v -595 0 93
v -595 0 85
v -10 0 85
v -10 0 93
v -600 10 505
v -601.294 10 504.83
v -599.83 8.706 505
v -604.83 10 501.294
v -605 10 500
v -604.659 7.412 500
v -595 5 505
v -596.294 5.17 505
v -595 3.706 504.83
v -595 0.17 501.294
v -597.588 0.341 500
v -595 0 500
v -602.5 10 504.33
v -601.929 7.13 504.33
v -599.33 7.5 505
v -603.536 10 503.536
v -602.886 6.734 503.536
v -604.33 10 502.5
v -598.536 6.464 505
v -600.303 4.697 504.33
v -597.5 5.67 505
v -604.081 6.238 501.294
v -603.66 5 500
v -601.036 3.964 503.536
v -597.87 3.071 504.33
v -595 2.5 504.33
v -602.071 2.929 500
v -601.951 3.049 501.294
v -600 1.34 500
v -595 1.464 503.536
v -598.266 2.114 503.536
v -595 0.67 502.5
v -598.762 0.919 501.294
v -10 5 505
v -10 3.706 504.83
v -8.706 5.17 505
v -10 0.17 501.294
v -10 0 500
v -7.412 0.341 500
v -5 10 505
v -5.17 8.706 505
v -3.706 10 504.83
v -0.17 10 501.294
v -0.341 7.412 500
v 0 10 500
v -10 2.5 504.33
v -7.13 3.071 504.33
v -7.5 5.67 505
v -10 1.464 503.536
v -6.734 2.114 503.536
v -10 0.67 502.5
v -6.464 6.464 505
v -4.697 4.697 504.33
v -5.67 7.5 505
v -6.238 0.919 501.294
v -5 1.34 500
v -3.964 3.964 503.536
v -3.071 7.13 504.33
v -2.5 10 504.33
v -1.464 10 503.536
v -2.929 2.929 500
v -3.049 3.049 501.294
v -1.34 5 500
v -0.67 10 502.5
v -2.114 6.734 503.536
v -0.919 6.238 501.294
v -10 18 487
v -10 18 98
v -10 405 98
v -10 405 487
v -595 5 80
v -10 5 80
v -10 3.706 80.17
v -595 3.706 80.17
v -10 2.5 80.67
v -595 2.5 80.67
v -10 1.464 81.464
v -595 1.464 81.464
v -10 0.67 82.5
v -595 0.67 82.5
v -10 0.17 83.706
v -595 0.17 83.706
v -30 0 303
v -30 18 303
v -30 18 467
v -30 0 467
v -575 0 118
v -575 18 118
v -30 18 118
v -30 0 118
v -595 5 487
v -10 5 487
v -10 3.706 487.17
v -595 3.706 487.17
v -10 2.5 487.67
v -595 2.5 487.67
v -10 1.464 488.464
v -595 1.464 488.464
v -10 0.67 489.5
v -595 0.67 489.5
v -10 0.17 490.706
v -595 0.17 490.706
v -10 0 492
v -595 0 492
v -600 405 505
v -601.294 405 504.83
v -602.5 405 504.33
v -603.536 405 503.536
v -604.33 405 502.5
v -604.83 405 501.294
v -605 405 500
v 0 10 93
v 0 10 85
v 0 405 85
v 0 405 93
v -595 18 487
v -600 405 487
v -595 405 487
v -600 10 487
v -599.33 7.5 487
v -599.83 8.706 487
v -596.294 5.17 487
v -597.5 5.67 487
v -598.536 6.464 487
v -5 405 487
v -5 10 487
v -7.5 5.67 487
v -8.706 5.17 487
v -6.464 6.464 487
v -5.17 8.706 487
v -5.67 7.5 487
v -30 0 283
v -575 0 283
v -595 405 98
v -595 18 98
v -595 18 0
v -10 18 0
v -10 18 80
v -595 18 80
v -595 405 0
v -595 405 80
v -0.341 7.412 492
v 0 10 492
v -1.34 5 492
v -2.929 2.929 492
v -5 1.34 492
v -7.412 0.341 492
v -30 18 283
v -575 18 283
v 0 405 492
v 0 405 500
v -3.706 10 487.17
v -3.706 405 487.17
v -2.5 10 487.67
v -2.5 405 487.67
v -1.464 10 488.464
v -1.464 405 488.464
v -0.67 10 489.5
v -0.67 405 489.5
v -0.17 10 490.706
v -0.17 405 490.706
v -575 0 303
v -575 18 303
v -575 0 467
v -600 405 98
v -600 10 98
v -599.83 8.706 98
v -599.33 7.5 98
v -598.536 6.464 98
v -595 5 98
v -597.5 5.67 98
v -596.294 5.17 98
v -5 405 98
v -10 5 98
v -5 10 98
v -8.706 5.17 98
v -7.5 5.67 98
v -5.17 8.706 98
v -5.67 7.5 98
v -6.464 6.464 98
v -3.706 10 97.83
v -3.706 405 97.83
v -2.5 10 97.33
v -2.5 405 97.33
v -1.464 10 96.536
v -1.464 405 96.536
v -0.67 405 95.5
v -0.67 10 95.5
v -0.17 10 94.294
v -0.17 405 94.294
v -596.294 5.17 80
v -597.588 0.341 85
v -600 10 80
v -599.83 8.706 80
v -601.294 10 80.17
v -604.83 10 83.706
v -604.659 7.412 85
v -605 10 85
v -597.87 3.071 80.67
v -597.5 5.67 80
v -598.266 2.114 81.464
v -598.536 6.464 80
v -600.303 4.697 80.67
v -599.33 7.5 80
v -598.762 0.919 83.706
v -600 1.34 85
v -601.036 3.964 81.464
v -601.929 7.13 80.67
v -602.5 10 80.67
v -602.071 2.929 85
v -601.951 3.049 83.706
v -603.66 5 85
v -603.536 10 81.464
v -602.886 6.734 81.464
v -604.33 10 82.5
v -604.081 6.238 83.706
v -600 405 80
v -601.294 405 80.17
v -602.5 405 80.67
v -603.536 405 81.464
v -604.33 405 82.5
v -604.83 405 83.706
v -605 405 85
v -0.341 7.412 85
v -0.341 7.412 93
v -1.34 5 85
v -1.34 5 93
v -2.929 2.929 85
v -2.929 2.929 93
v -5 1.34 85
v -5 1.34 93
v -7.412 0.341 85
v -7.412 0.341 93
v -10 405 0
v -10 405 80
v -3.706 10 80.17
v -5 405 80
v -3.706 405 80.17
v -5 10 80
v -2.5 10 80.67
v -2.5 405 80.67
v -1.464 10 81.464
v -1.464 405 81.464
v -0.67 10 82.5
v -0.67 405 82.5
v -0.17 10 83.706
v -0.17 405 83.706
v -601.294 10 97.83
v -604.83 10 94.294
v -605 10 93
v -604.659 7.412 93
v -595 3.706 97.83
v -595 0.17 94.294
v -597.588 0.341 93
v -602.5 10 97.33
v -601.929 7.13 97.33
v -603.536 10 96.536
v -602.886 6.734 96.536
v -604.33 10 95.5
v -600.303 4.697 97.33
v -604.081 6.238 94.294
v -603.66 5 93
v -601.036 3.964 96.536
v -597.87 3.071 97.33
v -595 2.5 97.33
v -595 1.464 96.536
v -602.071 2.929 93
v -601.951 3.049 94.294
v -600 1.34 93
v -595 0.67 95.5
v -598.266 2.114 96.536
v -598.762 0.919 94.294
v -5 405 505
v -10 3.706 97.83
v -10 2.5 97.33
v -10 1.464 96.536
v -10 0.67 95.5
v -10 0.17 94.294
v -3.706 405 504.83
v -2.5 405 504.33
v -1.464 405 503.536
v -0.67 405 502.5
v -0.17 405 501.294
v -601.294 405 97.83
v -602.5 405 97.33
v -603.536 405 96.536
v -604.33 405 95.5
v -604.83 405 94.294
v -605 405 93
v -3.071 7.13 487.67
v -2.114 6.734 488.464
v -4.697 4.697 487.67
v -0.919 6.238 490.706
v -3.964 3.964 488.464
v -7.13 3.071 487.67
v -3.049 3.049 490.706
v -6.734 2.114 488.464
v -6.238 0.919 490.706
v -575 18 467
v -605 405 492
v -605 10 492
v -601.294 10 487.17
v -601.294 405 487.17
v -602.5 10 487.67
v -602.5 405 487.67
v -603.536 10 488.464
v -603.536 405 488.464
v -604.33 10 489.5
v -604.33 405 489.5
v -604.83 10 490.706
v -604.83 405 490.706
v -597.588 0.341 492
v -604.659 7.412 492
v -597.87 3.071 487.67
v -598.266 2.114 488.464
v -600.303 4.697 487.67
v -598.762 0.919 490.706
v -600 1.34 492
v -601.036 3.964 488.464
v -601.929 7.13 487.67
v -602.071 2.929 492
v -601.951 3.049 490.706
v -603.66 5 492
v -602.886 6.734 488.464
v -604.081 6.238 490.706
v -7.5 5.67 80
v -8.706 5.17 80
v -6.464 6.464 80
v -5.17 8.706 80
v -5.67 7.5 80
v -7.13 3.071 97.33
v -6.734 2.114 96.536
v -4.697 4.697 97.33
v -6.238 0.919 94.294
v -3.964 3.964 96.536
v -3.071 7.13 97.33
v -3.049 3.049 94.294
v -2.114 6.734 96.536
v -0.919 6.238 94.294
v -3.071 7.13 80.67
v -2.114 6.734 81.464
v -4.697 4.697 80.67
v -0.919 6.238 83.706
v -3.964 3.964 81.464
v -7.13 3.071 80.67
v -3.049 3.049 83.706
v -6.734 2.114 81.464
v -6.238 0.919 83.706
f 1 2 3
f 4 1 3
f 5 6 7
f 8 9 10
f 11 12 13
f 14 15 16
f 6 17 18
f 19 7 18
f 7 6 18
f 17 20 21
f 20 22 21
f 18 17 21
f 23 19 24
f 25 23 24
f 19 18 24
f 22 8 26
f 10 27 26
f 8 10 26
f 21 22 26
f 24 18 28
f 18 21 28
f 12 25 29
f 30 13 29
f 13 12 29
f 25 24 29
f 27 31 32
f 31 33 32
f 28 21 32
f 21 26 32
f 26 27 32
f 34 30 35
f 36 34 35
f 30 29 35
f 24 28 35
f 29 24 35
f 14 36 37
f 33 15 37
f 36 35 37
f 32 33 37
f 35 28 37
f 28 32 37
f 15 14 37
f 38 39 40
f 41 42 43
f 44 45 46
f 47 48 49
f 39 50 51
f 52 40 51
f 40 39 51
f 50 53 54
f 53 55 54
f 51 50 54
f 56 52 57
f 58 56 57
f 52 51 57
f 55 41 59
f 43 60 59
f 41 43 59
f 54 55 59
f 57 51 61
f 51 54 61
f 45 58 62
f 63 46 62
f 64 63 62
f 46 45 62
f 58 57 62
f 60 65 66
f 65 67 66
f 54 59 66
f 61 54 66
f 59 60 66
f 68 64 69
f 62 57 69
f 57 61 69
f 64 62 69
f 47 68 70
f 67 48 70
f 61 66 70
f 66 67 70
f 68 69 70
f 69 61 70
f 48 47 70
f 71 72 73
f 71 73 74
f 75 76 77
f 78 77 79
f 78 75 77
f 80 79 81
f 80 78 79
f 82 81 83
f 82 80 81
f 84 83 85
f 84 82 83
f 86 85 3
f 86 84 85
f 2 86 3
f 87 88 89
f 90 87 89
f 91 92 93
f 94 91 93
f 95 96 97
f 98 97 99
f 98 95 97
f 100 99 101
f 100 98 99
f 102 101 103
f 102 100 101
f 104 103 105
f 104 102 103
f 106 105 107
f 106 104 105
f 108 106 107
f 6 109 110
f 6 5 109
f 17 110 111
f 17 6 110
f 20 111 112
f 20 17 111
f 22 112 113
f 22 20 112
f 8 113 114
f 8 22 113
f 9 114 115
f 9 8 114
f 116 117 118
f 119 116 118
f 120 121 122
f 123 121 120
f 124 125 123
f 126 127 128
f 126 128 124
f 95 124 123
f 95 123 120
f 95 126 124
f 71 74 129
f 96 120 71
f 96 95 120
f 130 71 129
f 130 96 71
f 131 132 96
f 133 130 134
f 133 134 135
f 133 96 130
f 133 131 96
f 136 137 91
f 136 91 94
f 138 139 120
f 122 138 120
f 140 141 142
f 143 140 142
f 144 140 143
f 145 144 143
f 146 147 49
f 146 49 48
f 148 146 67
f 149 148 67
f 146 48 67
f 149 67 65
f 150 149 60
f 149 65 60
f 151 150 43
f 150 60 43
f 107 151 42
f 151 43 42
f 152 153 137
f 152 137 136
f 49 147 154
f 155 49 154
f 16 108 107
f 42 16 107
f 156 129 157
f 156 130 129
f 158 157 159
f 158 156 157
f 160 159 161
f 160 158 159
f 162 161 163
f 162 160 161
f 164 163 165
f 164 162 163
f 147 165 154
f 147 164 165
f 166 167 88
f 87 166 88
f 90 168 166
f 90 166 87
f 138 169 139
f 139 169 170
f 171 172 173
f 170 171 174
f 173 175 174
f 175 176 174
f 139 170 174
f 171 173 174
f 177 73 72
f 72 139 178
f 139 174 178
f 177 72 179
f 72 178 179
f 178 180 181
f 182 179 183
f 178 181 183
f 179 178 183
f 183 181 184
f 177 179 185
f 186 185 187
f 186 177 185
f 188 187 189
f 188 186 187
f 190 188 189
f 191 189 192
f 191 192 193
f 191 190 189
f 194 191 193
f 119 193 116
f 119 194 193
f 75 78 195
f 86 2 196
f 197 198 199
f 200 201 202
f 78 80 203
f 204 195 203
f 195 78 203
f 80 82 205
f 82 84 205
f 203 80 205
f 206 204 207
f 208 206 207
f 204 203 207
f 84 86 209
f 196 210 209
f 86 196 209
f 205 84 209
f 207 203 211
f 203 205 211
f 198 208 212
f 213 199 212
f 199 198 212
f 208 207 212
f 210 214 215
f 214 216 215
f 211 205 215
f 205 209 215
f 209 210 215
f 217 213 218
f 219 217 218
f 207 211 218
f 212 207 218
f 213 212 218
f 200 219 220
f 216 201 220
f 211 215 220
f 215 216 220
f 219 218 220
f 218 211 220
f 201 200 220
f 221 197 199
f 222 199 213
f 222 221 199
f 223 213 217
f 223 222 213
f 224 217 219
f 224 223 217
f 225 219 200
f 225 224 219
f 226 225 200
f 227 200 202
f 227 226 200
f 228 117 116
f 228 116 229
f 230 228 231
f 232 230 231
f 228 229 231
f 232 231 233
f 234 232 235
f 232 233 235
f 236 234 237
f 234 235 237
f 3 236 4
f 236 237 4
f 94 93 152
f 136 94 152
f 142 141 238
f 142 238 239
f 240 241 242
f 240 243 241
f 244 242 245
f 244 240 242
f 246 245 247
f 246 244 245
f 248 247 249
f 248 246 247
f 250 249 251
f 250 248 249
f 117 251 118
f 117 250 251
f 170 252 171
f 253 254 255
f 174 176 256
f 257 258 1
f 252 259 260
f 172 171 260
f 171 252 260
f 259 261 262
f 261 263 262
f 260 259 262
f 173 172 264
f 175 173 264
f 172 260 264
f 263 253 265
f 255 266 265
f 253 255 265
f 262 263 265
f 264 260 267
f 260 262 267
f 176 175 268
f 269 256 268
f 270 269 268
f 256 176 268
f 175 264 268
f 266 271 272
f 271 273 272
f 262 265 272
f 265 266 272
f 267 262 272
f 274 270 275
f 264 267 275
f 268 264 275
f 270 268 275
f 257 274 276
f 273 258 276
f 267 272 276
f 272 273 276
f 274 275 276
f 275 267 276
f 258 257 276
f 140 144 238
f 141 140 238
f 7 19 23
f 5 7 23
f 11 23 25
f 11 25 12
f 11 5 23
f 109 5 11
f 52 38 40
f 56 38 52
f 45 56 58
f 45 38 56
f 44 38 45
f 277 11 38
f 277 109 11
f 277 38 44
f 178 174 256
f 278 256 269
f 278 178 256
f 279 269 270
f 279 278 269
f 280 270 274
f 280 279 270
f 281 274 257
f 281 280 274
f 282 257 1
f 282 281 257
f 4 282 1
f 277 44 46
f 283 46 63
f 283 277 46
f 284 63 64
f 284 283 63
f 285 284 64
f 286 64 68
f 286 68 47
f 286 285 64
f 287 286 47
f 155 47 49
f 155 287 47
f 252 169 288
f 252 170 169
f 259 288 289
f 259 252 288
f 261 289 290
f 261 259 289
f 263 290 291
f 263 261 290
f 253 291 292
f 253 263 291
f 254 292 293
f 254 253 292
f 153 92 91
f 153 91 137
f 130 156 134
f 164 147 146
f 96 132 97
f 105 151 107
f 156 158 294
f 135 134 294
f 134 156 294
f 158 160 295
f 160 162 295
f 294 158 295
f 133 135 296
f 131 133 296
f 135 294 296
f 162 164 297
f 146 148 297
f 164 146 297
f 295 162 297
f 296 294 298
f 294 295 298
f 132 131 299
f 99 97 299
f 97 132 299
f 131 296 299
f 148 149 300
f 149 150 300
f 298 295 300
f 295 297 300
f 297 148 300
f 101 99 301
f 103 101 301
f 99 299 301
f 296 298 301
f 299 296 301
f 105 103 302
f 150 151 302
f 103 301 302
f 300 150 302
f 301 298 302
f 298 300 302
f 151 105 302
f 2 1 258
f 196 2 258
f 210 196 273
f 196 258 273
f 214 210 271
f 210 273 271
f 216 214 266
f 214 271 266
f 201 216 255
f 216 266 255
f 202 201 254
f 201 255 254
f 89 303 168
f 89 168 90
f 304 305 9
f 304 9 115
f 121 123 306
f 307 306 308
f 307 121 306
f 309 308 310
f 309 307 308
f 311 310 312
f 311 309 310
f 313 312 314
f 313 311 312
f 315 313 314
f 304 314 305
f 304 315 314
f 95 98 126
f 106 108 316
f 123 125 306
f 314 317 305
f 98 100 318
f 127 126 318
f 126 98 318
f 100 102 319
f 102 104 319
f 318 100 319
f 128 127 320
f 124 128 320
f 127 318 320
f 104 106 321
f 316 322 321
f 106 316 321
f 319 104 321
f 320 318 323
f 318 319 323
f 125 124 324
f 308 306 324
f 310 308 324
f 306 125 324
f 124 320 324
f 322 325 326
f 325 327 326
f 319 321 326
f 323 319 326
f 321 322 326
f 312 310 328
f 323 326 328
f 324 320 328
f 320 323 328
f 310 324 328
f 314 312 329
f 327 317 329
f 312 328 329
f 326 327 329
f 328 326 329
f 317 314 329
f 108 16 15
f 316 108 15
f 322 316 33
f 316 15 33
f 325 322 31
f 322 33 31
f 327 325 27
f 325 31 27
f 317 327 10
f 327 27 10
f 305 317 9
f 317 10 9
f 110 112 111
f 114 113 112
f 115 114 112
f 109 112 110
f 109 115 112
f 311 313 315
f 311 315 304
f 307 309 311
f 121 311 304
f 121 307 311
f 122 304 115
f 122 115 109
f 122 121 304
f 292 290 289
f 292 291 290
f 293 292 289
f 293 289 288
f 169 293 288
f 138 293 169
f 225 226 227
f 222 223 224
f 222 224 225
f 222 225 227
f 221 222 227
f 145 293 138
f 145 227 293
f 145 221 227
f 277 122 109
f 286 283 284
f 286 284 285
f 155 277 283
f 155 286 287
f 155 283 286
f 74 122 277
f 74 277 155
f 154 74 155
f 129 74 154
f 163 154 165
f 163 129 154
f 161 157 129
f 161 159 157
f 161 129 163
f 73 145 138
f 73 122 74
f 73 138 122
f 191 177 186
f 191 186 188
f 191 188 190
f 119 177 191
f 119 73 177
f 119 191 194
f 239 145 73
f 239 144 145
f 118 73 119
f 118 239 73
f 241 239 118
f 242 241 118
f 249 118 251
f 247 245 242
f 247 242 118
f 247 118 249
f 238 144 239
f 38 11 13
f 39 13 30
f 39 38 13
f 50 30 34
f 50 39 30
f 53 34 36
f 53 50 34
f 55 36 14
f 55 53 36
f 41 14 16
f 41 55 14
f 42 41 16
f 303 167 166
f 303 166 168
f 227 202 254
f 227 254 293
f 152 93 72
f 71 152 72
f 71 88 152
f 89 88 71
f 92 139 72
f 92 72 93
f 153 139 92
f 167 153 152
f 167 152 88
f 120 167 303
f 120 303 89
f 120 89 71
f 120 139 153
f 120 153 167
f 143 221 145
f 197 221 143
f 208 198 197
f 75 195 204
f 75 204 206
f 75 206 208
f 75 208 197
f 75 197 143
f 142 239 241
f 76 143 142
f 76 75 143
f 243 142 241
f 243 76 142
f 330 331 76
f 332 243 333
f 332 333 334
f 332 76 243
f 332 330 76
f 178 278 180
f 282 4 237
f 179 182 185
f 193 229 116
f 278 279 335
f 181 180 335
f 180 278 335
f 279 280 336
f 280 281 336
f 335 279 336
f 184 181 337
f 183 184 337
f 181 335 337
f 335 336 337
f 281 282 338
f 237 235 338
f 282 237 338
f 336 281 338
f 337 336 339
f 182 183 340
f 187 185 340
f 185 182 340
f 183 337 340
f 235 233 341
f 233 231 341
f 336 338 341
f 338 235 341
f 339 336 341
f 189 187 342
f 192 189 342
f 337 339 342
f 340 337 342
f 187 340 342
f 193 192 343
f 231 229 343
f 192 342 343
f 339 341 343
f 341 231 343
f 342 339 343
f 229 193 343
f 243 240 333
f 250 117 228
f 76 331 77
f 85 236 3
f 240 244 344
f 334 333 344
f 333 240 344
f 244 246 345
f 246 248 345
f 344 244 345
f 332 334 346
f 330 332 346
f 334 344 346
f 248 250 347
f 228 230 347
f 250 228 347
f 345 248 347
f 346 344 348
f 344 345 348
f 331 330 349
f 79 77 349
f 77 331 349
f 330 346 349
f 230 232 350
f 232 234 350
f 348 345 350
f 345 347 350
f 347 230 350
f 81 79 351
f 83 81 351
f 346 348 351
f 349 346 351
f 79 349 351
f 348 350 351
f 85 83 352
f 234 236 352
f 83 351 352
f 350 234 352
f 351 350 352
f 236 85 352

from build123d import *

# Parameters (mm, degrees)
F0_W      = 605
F0_H      = 405
F1_DEPTH  = 505
F2_W      = 10
F2_H      = 389
F2_H_2    = 80
F3_DEPTH  = 410
F4_W      = 18
F4_H      = 389
F4_H_2    = 80
F5_DEPTH  = 610
F7_DEPTH  = 510
F8_R      = 5
F9_W      = 545
F9_H      = 164
F9_H_2    = 165
F10_DEPTH = 18


with BuildPart() as f1:
    # F0 (on Top) → F1 (new body)
    with BuildSketch(Plane.XY):
        with Locations((-302.5, 202.5)):
            Rectangle(F0_W, F0_H)
    extrude(amount=F1_DEPTH)

    # F2 (on face) → F3 (cut)
    with BuildSketch(Plane.XZ):
        with Locations((-600, 292.5)):
            Rectangle(F2_W, F2_H)
        with Locations((-600, 40)):
            Rectangle(F2_W, F2_H_2)
        with Locations((-5, 292.5)):
            Rectangle(F2_W, F2_H)
        with Locations((-5, 40)):
            Rectangle(F2_W, F2_H_2)
    extrude(amount=-F3_DEPTH, mode=Mode.SUBTRACT)

    # F4 (on face) → F5 (cut)
    with BuildSketch(Plane(origin=(-595, 0, 0), x_dir=(0, -1, 0), z_dir=(-1, 0, 0))):
        with Locations((-9, 292.5)):
            Rectangle(F4_W, F4_H)
        with Locations((-9, 40)):
            Rectangle(F4_W, F4_H_2)
    extrude(amount=-F5_DEPTH, mode=Mode.SUBTRACT)

    # F6 (on face) → F7 (cut)
    with BuildSketch(Plane.XY.offset(505)):
        with BuildLine():
            ThreePointArc((-595, 0), (-602.0710678119, 2.9289321881), (-605, 10))
            Line((-605, 10), (-605, 0))
            Line((-605, 0), (-595, 0))
        make_face()
        with BuildLine():
            Line((0, 0), (0, 10))
            ThreePointArc((0, 10), (-2.9289321881, 2.9289321881), (-10, 0))
            Line((-10, 0), (0, 0))
        make_face()
    extrude(amount=-F7_DEPTH, mode=Mode.SUBTRACT)

    # F8
    f8_edges = [f1.edges().sort_by_distance(p)[0] for p in [
        (-302.5, 0, 505),
        (-302.5, 0, 487),
        (-302.5, 0, 98),
        (-302.5, 0, 80),
    ]]
    fillet(f8_edges, radius=F8_R)

    # F9 (on face) → F10 (join)
    with BuildSketch(Plane.XZ.offset(-18)):
        with Locations((-302.5, 385)):
            Rectangle(F9_W, F9_H)
        with Locations((-302.5, 200.5)):
            Rectangle(F9_W, F9_H_2)
    extrude(amount=F10_DEPTH)


solid = f1.part
